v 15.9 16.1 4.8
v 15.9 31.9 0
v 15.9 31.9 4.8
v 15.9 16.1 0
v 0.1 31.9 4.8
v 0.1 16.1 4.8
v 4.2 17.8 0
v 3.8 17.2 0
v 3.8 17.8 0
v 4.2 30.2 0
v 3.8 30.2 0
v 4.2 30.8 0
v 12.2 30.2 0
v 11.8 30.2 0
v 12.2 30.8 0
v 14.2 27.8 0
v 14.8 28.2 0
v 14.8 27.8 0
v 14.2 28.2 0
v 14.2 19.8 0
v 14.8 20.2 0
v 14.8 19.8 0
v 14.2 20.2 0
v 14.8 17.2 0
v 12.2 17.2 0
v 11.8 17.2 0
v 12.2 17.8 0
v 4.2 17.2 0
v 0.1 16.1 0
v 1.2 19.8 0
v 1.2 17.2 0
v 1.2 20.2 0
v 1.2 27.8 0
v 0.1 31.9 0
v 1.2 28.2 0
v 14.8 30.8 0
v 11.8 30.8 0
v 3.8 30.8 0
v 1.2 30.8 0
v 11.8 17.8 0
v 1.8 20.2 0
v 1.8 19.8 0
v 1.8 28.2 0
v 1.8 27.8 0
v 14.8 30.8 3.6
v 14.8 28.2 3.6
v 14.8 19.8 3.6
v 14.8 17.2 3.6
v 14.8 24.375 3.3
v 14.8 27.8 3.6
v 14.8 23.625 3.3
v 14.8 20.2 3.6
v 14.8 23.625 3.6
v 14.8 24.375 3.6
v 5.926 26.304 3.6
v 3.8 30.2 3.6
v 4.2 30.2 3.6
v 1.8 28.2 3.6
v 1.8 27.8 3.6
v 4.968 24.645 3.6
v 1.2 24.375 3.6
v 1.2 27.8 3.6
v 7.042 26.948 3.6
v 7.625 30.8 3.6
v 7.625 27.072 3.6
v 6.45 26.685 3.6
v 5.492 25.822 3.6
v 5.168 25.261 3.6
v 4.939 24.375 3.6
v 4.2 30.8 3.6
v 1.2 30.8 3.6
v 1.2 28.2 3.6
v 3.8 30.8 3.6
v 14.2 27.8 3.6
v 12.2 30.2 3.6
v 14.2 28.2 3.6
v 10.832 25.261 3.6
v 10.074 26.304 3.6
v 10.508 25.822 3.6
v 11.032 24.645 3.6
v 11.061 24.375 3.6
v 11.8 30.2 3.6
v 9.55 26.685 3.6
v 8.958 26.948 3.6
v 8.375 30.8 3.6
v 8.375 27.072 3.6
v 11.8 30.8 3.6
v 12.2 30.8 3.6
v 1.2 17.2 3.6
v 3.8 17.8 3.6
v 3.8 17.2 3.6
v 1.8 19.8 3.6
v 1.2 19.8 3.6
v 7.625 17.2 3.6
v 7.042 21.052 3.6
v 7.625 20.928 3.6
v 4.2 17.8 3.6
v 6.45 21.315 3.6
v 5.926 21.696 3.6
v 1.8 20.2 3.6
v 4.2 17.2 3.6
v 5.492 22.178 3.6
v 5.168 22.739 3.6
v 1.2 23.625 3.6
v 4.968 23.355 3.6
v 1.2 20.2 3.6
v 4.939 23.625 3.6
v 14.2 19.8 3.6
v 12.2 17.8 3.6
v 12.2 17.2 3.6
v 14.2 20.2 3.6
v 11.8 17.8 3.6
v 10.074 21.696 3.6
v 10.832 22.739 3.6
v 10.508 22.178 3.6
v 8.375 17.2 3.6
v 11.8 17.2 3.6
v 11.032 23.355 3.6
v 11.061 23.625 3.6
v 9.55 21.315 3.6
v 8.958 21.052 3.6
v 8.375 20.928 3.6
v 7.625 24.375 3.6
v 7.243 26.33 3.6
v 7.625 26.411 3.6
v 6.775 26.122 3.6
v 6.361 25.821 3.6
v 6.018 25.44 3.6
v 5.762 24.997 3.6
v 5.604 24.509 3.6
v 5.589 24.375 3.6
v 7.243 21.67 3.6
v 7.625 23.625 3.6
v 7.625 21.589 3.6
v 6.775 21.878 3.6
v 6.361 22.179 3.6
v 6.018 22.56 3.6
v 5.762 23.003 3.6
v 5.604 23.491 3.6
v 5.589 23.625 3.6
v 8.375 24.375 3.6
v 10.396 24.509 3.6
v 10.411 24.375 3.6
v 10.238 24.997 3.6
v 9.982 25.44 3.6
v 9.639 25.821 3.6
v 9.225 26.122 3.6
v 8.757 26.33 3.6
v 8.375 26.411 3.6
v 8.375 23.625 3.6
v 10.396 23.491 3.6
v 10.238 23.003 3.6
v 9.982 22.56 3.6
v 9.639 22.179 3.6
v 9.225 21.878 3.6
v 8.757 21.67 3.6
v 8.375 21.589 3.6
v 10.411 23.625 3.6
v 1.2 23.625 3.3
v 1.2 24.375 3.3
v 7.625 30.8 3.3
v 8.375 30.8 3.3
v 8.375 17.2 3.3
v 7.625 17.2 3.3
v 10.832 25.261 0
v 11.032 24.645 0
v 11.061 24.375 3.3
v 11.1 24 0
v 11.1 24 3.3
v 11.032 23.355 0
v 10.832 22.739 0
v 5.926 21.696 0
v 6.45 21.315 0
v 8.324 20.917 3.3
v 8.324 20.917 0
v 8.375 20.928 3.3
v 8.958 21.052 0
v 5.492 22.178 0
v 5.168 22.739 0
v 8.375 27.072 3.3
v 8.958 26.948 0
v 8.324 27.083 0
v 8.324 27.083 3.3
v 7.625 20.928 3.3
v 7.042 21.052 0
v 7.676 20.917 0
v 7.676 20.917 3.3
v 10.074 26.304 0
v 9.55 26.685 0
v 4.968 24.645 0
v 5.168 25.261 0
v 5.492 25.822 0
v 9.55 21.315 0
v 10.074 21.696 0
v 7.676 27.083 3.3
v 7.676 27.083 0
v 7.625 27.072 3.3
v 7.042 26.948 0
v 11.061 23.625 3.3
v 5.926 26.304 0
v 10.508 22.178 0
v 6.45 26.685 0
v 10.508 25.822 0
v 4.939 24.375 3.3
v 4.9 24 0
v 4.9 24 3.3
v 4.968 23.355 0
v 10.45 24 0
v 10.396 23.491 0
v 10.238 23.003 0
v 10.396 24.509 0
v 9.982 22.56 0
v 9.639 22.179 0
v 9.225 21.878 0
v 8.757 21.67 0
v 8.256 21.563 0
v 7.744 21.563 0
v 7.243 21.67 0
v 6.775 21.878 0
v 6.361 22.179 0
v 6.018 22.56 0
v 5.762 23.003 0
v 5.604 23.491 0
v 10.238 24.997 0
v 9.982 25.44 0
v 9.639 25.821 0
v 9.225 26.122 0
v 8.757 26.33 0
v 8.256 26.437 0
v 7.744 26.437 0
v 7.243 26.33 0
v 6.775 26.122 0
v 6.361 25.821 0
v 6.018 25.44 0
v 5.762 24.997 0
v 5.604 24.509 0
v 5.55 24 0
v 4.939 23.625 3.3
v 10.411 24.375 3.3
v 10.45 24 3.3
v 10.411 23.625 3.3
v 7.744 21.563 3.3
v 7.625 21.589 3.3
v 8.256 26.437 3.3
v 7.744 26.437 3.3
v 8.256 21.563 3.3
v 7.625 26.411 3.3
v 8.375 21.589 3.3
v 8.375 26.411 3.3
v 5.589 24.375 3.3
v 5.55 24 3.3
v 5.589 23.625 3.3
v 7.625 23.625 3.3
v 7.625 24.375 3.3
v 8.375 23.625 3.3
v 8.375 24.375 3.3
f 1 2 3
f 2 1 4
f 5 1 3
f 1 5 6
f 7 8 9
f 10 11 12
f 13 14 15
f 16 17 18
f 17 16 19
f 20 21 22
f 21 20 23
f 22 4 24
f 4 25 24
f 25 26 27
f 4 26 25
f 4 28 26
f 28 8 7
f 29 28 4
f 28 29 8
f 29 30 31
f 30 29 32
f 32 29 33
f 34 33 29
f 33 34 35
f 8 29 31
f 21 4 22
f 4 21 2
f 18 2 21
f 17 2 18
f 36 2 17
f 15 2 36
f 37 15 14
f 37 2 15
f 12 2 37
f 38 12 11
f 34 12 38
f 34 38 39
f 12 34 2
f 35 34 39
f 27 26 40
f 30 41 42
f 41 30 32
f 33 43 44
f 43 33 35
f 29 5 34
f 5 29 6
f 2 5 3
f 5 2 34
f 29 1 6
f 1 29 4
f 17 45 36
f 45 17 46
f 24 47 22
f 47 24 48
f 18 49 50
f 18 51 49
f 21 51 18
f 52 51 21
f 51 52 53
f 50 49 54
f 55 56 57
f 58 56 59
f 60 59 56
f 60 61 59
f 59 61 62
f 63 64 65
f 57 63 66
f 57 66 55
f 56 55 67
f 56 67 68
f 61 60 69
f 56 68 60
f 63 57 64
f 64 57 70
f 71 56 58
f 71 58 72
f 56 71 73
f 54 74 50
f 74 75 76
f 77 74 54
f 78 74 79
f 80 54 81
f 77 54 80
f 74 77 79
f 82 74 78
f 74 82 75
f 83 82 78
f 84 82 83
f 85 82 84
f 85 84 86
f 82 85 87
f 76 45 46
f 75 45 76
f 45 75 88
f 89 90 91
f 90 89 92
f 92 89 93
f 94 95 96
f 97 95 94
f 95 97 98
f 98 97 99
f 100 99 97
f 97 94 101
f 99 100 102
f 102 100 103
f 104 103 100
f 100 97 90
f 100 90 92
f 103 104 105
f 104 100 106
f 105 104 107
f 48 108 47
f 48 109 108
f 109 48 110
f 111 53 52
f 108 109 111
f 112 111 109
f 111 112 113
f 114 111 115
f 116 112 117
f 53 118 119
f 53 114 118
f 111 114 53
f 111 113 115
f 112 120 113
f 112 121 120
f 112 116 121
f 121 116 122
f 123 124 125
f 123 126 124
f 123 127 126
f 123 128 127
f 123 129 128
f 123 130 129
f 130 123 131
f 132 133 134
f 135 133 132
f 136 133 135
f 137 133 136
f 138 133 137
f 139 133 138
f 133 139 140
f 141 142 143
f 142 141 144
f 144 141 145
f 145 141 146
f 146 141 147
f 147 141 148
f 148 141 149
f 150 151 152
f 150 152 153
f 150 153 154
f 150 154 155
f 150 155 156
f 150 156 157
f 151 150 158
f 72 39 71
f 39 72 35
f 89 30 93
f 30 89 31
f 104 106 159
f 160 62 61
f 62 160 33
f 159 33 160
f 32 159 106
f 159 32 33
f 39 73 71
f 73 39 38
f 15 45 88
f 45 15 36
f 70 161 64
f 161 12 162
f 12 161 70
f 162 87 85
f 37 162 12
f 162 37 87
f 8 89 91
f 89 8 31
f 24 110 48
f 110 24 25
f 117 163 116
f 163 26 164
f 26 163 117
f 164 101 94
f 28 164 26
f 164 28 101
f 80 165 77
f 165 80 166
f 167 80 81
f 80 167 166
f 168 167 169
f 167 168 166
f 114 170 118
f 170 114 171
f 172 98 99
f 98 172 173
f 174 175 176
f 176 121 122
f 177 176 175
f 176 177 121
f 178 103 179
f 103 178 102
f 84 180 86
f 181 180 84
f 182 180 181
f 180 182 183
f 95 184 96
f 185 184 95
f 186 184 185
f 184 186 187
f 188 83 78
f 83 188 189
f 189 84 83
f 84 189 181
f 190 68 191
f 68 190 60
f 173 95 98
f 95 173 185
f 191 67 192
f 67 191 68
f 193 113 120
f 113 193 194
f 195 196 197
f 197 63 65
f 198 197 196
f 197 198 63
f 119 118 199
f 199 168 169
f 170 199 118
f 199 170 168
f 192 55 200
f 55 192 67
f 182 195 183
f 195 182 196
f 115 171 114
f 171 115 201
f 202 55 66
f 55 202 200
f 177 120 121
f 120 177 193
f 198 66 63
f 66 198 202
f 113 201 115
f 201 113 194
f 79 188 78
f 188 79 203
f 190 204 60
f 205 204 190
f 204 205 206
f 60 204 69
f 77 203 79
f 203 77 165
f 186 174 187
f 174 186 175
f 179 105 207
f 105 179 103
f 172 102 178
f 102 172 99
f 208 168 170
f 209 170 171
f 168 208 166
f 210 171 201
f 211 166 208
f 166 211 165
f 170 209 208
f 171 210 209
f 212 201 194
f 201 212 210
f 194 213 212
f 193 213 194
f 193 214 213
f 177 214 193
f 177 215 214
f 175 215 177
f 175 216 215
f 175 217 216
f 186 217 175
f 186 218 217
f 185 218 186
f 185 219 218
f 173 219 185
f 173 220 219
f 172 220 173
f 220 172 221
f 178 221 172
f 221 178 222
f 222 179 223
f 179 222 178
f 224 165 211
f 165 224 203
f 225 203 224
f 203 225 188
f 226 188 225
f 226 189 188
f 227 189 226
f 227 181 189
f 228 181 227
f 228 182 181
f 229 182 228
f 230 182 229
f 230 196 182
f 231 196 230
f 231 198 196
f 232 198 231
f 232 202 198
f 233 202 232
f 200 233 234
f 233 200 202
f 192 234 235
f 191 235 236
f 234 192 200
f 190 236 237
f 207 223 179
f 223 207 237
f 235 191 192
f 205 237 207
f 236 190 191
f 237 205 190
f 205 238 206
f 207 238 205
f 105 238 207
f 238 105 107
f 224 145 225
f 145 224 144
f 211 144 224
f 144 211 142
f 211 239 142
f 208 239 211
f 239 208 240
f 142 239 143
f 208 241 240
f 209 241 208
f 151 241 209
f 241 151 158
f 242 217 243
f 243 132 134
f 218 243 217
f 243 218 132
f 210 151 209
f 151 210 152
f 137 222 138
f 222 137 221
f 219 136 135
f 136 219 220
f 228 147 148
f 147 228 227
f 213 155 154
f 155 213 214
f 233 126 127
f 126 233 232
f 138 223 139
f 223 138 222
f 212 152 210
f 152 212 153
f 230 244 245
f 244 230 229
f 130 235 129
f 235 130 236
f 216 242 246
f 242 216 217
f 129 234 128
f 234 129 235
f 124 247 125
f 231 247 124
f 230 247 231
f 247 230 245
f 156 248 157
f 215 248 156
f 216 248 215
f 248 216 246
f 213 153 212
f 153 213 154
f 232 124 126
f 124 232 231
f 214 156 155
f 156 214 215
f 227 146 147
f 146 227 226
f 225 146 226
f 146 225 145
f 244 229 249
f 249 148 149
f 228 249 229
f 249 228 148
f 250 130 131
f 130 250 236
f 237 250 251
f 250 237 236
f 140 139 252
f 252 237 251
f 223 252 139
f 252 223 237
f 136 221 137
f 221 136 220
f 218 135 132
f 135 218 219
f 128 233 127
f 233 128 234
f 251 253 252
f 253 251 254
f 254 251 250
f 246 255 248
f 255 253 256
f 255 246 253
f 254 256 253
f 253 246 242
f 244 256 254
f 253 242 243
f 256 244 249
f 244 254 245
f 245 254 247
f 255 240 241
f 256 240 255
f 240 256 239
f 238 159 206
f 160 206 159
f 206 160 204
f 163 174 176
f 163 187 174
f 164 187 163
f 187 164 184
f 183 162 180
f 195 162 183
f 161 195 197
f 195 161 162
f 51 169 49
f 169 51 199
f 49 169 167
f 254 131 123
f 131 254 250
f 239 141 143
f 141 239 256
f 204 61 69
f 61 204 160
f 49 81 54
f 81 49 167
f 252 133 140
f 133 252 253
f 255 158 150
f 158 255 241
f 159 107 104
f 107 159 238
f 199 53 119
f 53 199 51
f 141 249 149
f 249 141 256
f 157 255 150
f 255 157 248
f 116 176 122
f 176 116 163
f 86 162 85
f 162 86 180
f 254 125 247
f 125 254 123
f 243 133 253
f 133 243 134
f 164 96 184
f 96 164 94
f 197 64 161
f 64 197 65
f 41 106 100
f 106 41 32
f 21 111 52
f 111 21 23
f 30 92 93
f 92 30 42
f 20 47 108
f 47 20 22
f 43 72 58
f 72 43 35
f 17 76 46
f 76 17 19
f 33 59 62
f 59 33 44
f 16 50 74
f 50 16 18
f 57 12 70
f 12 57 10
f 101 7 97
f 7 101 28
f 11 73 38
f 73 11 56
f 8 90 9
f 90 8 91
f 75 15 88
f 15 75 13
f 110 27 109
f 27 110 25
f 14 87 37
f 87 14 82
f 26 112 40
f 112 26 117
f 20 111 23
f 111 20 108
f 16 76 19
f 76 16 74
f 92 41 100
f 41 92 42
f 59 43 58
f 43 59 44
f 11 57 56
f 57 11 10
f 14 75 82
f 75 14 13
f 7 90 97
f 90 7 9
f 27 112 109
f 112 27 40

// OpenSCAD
// file: ../lib/doblo-params-felixtec4.scad
/*
 Copyright (c) 2013 Daniel M. Taub
 Copyright (c) 2010 Daniel K. Schneider
 
 This file is part of DobloFactory.

 DobloFactory is free source: you can redistribute it and/or modify
    modify it under the terms of the CC BY-NC-SA 3.0 License:
    CreativeCommons Attribution-NonCommerical-ShareAlike 3.0
    as published by Creative Commons. 

    You should have received a copy of the CC BY-NC-SA 3.0 License 
    with this source package. 
    If not, see <http://creativecommons.org/licenses/by-nc-sa/3.0/>

-------------------------
PARAMETERS              -
-------------------------

These parameters define in principle all dimensions of lego and duplo compatible blocks

Close to DUPLO dimensions by default, but underestimating Lego dimensions. Depending on your printer and your layer/thickness printing parameters you do want to change nibbles and walls.

The settings below are for a layer Thickness of 0.25mm and FAST printingh  !!! Tested with a Felix TEC4.1.

All units are mm.

Dimensions: 
* A typical small 2x2 nibbles on top DUPLO compatible brick with one nibble underneath is
32mm x 32mm x 19.2mm (plus a nibble height of 4.5mm)
* LEGO-compatible bricks are half that size in all three dimensions

*/

// Normal size (DUPLO)
// SCALE = 1;
// Lego size - see also the hacks in the code for fixing wall and nibble dimensions
// SCALE = 0.5 ;
// Mini Lego size / Nano - does not really work yet, but you can try
// SCALE = 0.25

// DATA FOR QUATRO (DMT)
// nibble outter diam: 18.45 
// nibble inner diam: 14.45 
// nibble inner nub(for duplo) diam: 13.25 

CADRO = 2; // not yet tested
DOBLO = 1;
LUGO = 0.5;
MINI = 0.25; // not tested much

/* SHAVE to correct inaccurate FDM printing, i.e. objects larger than they should be
This will be substracted from the outer wall. I you got a powder or resin printer, set to 0.
 */
SHAVE = 0.15; // about half extrusion size

/* Heights */
HALF = 3;
THIRD = 2;
THIRDx2 = 4;
FULL = 6;

// defines minimum size of a fragment of a nibble, e.g. set openscad $fs
// Smaller is better, but will take much more time for rendering and slicing
NIBBLE_FS = 0.5;
CYL_FS = 2;

// LEGO SCALE - don't change, allows to create nano legos, should be 1 if real Legos
function LEGO_SCALE(SCALE) = 2 * SCALE;

// Doblo block size
// Real DUPLO Block = 31.7 / 2 = 15.85 (with some variations)
function PART_WIDTH(SCALE) = 16.0 * SCALE;

// Block height (a typical block is 4 * PART_HEIGHT)
// Real Duplo Block = 19.17 / 4 = 4.8, we also measured 19.09, 19.16
function PART_HEIGHT(SCALE) = (SCALE < 0.6) ? (1.6 * LEGO_SCALE(SCALE)) : (3.2 * SCALE);
// Diamonds - size of anti-warping holes - used optionally
DIAMOND = 4;

// Top nibble size definitions
// Must be adjusted with respect to layer resolution and other slicing considerations
DUPLO_TOP_NIBBLE_RADIUS_ADJUSTMENT = 0.2;
DUPLO_BOTTOM_NIBBLE_RADIUS_ADJUSTMENT = 0.2;

function NO(SCALE) = PART_WIDTH(SCALE) / 2.0; //nibble offset
function NBO(SCALE) = PART_WIDTH(SCALE); // nibble bottom offset
function NH(SCALE) = (SCALE < 0.6) ? 1.75 * LEGO_SCALE(SCALE) : 4.55 * SCALE; // LEGO vs. DUPLO 
function NB_RADIUS(SCALE) = (SCALE < 0.6) ? (4.9 / 2 * LEGO_SCALE(SCALE)) : (9.4 / 2.0 * SCALE + DUPLO_TOP_NIBBLE_RADIUS_ADJUSTMENT); // Lego vs. DUPLO
// Real DUPLO Block = 9.38 

function NB_RADIUS_INSIDE(SCALE) = 6.8 / 2 * SCALE + DUPLO_TOP_NIBBLE_RADIUS_ADJUSTMENT;
// 6.44 = Real DUPLO block

function NB_THICKNESS(SCALE) = NB_RADIUS(SCALE) - NB_RADIUS_INSIDE(SCALE);

// For square nibble supports in 1xM or Nx1 blocks
function ALONG_LEN(SCALE) = (PART_WIDTH(SCALE) - NB_RADIUS(SCALE)) / 1.7; //tighter fit than 1.8
function CROSS_LEN(SCALE) = (PART_WIDTH(SCALE) - NB_RADIUS(SCALE) / 2);

// Bottom nibbles size definitions
// Must be adjusted with respect to layer resolution and other slicing considerations
// Real Lego bottom radius = 6.5 to 6.55
// function NB_BOTTOM_RADIUS(SCALE)        = (SCALE < 0.6) ? 6.5/2*LEGO_SCALE(SCALE) : 13.45/2*SCALE; // REAL
// Real DUPLO outside diameter = 13.48
function NB_BOTTOM_RADIUS(SCALE) = (SCALE < 0.6) ? 6.2 / 2 * LEGO_SCALE(SCALE) : 13.2 / 2 * SCALE + DUPLO_BOTTOM_NIBBLE_RADIUS_ADJUSTMENT; // FAKE

function NB_BOTTOM_RADIUS_THIN(SCALE) = (SCALE < 0.6) ? 3.5 / 2 * LEGO_SCALE(SCALE) : 7.2 / 2 * SCALE; // Note: not adjusted for thin version

function NB_BOTTOM_RADIUS_INSIDE(SCALE) = (SCALE < 0.6) ? 4.7 / 2 * LEGO_SCALE(SCALE) : 10.8 / 2 * SCALE + DUPLO_BOTTOM_NIBBLE_RADIUS_ADJUSTMENT;
// Real DUPLO inside diameter = 10.73
// rapman 10.6
// Real Lego = 4.9

// walls - IMPORTANT: must be adjusted with respect to layer resolution and other slicing considerations
// function DOBLOWALL(SCALE) = (SCALE < 0.6) ? 1.2 * LEGO_SCALE(SCALE): 1.55 *SCALE; // REAL
function DOBLOWALL(SCALE) = (SCALE < 0.6) ? 1.0 * LEGO_SCALE(SCALE) : 1.50 * SCALE; // FAKE to make walls smaller
// Lego vs. Duplo, Lego is not 2x smaller
// Real Lego = 1.2

function USE_INSET(SCALE) = (SCALE < 0.6) ? true : true;
function INSET_WIDTH(SCALE) = (SCALE < 0.6) ? 0.4 * LEGO_SCALE(SCALE) : 1.50 * SCALE; //little inset walls to make it stick
function INSET_LENGTH(SCALE) = (SCALE < 0.6) ? 3 * DOBLOWALL(SCALE) : 4 * DOBLOWALL(SCALE); // Legos have proportionally smaller insets

//lattice width and height (optional, see LATTICE_TYPE)
// A grid underneath the flat bridge, crossing through the nibbles underneath
function LATTICE_WIDTH(SCALE) = 1.50 * SCALE;

// 0 means none, 1 means more spacing (same as nibbles underneath),
// 2 means denser, i.e. more beams
// 3 means a full lattice grid that extends down the floor (ugly but more stable)
LATTICE_TYPE = 1;

// Sizes of a standard 2x2 square brick, normal height
// Not used, but are practical in your custom modules
function DOBLOWIDTH(SCALE) = PART_WIDTH(SCALE) * 2.0 * SCALE;
function DOBLOHEIGHT(SCALE) = PART_HEIGHT(SCALE) * 6.0 * SCALE;
function LEGOHEIGHT(SCALE) = PART_HEIGHT(SCALE) * 6.0 * SCALE;
// file: ../lib/doblo-params.scad
/*
 Copyright (c) 2013 Daniel M. Taub
 Copyright (c) 2010 Daniel K. Schneider
 
 This file is part of DobloFactory.

 DobloFactory is free source: you can redistribute it and/or modify
    modify it under the terms of the CC BY-NC-SA 3.0 License:
    CreativeCommons Attribution-NonCommerical-ShareAlike 3.0
    as published by Creative Commons. 

    You should have received a copy of the CC BY-NC-SA 3.0 License 
    with this source package. 
    If not, see <http://creativecommons.org/licenses/by-nc-sa/3.0/>

-------------------------
PARAMETERS              -
-------------------------

These define in principle all dimensions. 

Close to DUPLO dimensions by default. Depending on your printer and your layer/thickness printing parameters you do want to change nibbles and walls. The settings below are for a layer Thickness of 0.25mm

All units are mm.

Dimensions: 
* A typical small 2x2 nibbles on top DUPLO compatible brick with one nibble underneath is
32mm x 32mm x 19.2mm (plus a nibble height of 4.5mm)
* LEGO-compatible bricks are half that size in all three dimensions

Scale:
* The SCALE constant must be set in your own *.scad file since variables cannot be reassigned at run time. This allows creation of both lego and duplo compatible bricks in one run.

Normal size (DUPLO size)
// SCALE = 1;
Lego size - see also the hacks in the code for fixing wall and nibble dimensions
// SCALE = 0.5 ;
Mini Lego size / Nano - does not really work yet, but you can try
// SCALE = 0.25

// DATA FOR QUATRO size (DMT)
// nibble outter diam: 18.45 
// nibble inner diam: 14.45 
// nibble inner nub(for duplo) diam: 13.25 
*/

CADRO = 2; // not yet tested
DOBLO = 1; 
LUGO = 0.5;
MINI = 0.25; // not tested much


/* SHAVE to correct inaccurate FDM printing, i.e. objects larger than they should be
This will be substracted from the outer wall. I you got a powder or resin printer, set to 0.
 */
SHAVE = 0.15; // about half extrusion size

/* Heights */
HALF=3;
THIRD=2;
THIRDx2=4;
FULL=6;

// defines minimum size of a fragment of a nibble, e.g. set openscad $fs
// Smaller is better, but will take much more time for rendering and slicing
NIBBLE_FS = 0.5;
CYL_FS = 2; 

// LEGO SCALE - don't change, allows to create nano legos, should be 1 if real Legos
function LEGO_SCALE(SCALE) = 2 * SCALE;

// Doblo block size
// Real DUPLO Block = 31.7 / 2 = 15.85 (with some variations)
function PART_WIDTH(SCALE)  = 16.0  * SCALE;

// Block height (a typical block is 4 * PART_HEIGHT)
// Real Duplo Block = 19.17 / 4 = 4.8, we also measured 19.09, 19.16
function PART_HEIGHT(SCALE)  = (SCALE < 0.6) ? ( 1.6 * LEGO_SCALE(SCALE) ) : ( 3.2 * SCALE );
// Diamonds - size of anti-warping holes - used optionally
DIAMOND = 4;

// Top nibble size definitions
// Must be adjusted with respect to layer resolution and other slicing considerations
function NO(SCALE)         = PART_WIDTH(SCALE) / 2.0;              //nibble offset
function NBO(SCALE)        = PART_WIDTH(SCALE);                   // nibble bottom offset
function NH(SCALE)         = (SCALE < 0.6) ? 1.75 * LEGO_SCALE(SCALE) : 4.55 * SCALE;  // LEGO vs. DUPLO 
function NB_RADIUS(SCALE)  = (SCALE < 0.6) ? (4.9 / 2 * LEGO_SCALE(SCALE)) : (9.2 / 2.0 * SCALE);  // Lego vs. DUPLO

// Real DUPLO Block = 9.38 
function NB_RADIUS_INSIDE(SCALE) = 6.8/2  * SCALE;  
// 6.44 = Real DUPLO block

function NB_THICKNESS(SCALE)=NB_RADIUS(SCALE)-NB_RADIUS_INSIDE(SCALE);

// For square nibble supports in 1xM or Nx1 blocks
function ALONG_LEN(SCALE)  = (PART_WIDTH(SCALE)-NB_RADIUS(SCALE))/1.7; //tighter fit than 1.8
function CROSS_LEN(SCALE)  = (PART_WIDTH(SCALE)-NB_RADIUS(SCALE)/2);

/* Bottom nibbles size definitions
Must be adjusted with respect to layer resolution and other slicing considerations. This is crucial for fit.
Real DUPLO outer radius = 13.48
Real Lego outer radius = 6.5
*/
function NB_BOTTOM_RADIUS(SCALE)        = (SCALE < 0.6) ? 6.2/2*LEGO_SCALE(SCALE) : 13.4/2*SCALE; // cheat
function NB_BOTTOM_RADIUS_THIN(SCALE)   = (SCALE < 0.6) ? 3.5/2*LEGO_SCALE(SCALE) : 7.2/2*SCALE;

function NB_BOTTOM_RADIUS_INSIDE(SCALE) = (SCALE < 0.6) ? 4.9/2*LEGO_SCALE(SCALE) : 10.8/2*SCALE;
// Real DUPLO inner r= 10.73
// Real Lego inner r = 4.9 the hole is not really needed, so if it is too small it will not matter

// walls - IMPORTANT: must be adjusted with respect to layer resolution and other slicing considerations
function DOBLOWALL(SCALE) = (SCALE < 0.6) ? 1.2 * LEGO_SCALE(SCALE): 1.55 *SCALE;
// Lego vs. Duplo, Lego is not 2x smaller
// Real Lego = 1.2

function USE_INSET(SCALE) = (SCALE < 0.6) ? true : true;
function INSET_WIDTH(SCALE)    = (SCALE < 0.6) ? 0.4 *LEGO_SCALE(SCALE) : 1.50 * SCALE; //little inset walls to make it stick
function INSET_LENGTH(SCALE)  = (SCALE < 0.6) ? 3*DOBLOWALL(SCALE) : 4*DOBLOWALL(SCALE); // Legos have proportionally smaller insets

//lattice width and height (optional, see LATTICE_TYPE)
// A grid underneath the flat bridge, crossing through the nibbles underneath
function LATTICE_WIDTH(SCALE)   = 1.50 * SCALE;

// 0 means none, 1 means more spacing (same as nibbles underneath),
// 2 means denser, i.e. more beams
// 3 means a full lattice grid that extends down the floor (ugly but more stable)
LATTICE_TYPE    = 1; 

// Sizes of a standard 2x2 square brick, normal height
// Not used, but are practical in your custom modules
function DOBLOWIDTH(SCALE)  = PART_WIDTH(SCALE)  * 2.0  * SCALE;
function DOBLOHEIGHT(SCALE) = PART_HEIGHT(SCALE) * 6.0  * SCALE;
function LEGOHEIGHT(SCALE)  = PART_HEIGHT(SCALE) * 6.0  * SCALE; 
// main file
include <../doblo-factory.scad>;
include <../lib/doblo-params.scad>;

SHAVE= 0.2;
length=4;
width=4;

// icon_brick();

simple (length=2, width=2);

module simple () {

color ("red") doblo (col=0,  row=-4, up=0,  
		     width=width,  length=length, height=HALF, 
		     nibbles_on_off=false,
		     diamonds_on_off=false,
		     shave=SHAVE,		     
		     scale=LUGO);		     
}

module icon_brick () {


color ("red") doblo (col=0,  row=-4, up=0,  
		     width=width,  length=length, height=HALF, 
		     nibbles_on_off=false,
		     diamonds_on_off=false,
		     shave=SHAVE,		     
		     scale=LUGO);		     
color ("lightblue") block (col=0,  row=-4, up=HALF,  
			   width=width,  length=length, height=HALF, 
			   nibbles_on_off=false,
			   diamonds_on_off=false,
			   shave=SHAVE,
			   scale=LUGO);
}
